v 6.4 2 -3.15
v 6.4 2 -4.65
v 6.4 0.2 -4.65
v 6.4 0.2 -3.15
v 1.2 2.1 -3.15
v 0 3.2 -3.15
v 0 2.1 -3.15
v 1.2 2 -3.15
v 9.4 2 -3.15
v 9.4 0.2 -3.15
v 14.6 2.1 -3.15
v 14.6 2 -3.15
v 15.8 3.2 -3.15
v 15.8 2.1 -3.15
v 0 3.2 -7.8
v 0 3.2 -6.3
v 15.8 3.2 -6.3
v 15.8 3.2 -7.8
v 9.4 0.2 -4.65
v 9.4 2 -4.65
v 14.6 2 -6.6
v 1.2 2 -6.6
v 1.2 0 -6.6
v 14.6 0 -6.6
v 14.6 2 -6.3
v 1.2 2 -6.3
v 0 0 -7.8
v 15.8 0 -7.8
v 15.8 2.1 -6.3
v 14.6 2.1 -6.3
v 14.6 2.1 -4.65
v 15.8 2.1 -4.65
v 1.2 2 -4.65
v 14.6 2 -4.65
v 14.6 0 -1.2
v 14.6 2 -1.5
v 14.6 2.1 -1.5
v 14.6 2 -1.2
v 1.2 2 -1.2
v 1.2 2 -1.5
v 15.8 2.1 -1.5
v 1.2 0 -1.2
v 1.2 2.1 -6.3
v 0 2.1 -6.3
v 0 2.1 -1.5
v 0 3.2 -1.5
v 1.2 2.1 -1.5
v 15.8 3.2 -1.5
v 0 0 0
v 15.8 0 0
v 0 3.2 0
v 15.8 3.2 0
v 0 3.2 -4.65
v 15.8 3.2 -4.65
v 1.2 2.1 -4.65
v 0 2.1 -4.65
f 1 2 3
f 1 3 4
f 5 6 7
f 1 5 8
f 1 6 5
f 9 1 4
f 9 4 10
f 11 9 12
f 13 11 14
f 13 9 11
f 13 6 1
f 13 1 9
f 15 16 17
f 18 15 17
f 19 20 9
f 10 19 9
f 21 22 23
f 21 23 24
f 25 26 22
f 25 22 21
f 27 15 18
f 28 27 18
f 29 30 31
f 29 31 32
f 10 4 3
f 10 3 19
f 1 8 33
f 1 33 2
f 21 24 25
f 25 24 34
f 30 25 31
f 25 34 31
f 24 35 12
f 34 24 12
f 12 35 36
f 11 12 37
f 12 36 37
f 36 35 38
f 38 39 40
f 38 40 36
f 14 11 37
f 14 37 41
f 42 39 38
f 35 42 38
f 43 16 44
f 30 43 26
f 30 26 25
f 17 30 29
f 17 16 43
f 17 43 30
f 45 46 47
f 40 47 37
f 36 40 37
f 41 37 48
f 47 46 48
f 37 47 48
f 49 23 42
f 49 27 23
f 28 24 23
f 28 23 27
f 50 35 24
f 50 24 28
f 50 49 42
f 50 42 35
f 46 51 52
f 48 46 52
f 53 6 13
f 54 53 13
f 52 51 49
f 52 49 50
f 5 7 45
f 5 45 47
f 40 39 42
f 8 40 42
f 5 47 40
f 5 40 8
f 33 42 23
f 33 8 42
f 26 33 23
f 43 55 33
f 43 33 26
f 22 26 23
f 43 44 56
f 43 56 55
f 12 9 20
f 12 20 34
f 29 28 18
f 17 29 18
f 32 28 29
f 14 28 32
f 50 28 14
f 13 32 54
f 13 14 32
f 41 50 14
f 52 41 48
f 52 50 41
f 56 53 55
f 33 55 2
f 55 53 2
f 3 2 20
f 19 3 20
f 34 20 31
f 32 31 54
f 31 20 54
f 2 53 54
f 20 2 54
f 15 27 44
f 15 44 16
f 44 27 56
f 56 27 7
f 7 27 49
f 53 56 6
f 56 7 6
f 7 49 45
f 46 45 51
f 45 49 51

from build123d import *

# Parameters (mm, degrees)
SKETCH1_W           = 15.8
SKETCH1_H           = 3.2
BOSS_EXTRUDE1_DEPTH = 7.8
SHELL1_T            = -1.2
SKETCH3_W           = 15.8
SKETCH3_H           = 1.65
CUT_EXTRUDE1_DEPTH  = 1.1
LPATTERN1_COUNT     = 2
LPATTERN1_PITCH     = 3.15
SKETCH5_W           = 13.4
SKETCH5_H           = 1.65
CUT_EXTRUDE2_DEPTH  = 18.74514018
LPATTERN2_COUNT     = 2
LPATTERN2_PITCH     = 3.15
SKETCH7_W           = 3
SKETCH7_H           = 1.5
BOSS_EXTRUDE2_DEPTH = 1.8


with BuildPart() as part:
    # Sketch1 → Boss-Extrude1 (new body)
    with BuildSketch(Plane.XY):
        with Locations((7.9, 1.6)):
            Rectangle(SKETCH1_W, SKETCH1_H)
    extrude(amount=-BOSS_EXTRUDE1_DEPTH)

    # Shell1
    shell1_openings = [part.faces().sort_by_distance(p)[0] for p in [
        (7.9, 0, -3.9),
    ]]
    offset(amount=SHELL1_T, openings=shell1_openings, kind=Kind.INTERSECTION)

    # Sketch3 → Cut-Extrude1 (cut)
    with BuildSketch(Plane(origin=(0, 3.2, 0), x_dir=(1, 0, 0), z_dir=(0, 1, 0))):
        with Locations((7.9, 5.475)):
            Rectangle(SKETCH3_W, SKETCH3_H)
    cut_extrude1 = extrude(amount=-CUT_EXTRUDE1_DEPTH, mode=Mode.SUBTRACT)

    # LPattern1: Cut-Extrude1 ×2
    with Locations(*[(0, 0, i * LPATTERN1_PITCH) for i in range(1, LPATTERN1_COUNT)]):
        add(cut_extrude1, mode=Mode.SUBTRACT)

    # Sketch5 → Cut-Extrude2 (cut, through all)
    with BuildSketch(Plane(origin=(0, 2.1, 0), x_dir=(1, 0, 0), z_dir=(0, 1, 0))):
        with Locations((7.9, 5.475)):
            Rectangle(SKETCH5_W, SKETCH5_H)
    cut_extrude2 = extrude(amount=-CUT_EXTRUDE2_DEPTH, mode=Mode.SUBTRACT)

    # LPattern2: Cut-Extrude2 ×2
    with Locations(*[(0, 0, i * LPATTERN2_PITCH) for i in range(1, LPATTERN2_COUNT)]):
        add(cut_extrude2, mode=Mode.SUBTRACT)

    # Sketch7 → Boss-Extrude2 (add)
    with BuildSketch(Plane.XZ.offset(-2)):
        with Locations((7.9, -3.9)):
            Rectangle(SKETCH7_W, SKETCH7_H)
    extrude(amount=BOSS_EXTRUDE2_DEPTH)


solid = part.part
